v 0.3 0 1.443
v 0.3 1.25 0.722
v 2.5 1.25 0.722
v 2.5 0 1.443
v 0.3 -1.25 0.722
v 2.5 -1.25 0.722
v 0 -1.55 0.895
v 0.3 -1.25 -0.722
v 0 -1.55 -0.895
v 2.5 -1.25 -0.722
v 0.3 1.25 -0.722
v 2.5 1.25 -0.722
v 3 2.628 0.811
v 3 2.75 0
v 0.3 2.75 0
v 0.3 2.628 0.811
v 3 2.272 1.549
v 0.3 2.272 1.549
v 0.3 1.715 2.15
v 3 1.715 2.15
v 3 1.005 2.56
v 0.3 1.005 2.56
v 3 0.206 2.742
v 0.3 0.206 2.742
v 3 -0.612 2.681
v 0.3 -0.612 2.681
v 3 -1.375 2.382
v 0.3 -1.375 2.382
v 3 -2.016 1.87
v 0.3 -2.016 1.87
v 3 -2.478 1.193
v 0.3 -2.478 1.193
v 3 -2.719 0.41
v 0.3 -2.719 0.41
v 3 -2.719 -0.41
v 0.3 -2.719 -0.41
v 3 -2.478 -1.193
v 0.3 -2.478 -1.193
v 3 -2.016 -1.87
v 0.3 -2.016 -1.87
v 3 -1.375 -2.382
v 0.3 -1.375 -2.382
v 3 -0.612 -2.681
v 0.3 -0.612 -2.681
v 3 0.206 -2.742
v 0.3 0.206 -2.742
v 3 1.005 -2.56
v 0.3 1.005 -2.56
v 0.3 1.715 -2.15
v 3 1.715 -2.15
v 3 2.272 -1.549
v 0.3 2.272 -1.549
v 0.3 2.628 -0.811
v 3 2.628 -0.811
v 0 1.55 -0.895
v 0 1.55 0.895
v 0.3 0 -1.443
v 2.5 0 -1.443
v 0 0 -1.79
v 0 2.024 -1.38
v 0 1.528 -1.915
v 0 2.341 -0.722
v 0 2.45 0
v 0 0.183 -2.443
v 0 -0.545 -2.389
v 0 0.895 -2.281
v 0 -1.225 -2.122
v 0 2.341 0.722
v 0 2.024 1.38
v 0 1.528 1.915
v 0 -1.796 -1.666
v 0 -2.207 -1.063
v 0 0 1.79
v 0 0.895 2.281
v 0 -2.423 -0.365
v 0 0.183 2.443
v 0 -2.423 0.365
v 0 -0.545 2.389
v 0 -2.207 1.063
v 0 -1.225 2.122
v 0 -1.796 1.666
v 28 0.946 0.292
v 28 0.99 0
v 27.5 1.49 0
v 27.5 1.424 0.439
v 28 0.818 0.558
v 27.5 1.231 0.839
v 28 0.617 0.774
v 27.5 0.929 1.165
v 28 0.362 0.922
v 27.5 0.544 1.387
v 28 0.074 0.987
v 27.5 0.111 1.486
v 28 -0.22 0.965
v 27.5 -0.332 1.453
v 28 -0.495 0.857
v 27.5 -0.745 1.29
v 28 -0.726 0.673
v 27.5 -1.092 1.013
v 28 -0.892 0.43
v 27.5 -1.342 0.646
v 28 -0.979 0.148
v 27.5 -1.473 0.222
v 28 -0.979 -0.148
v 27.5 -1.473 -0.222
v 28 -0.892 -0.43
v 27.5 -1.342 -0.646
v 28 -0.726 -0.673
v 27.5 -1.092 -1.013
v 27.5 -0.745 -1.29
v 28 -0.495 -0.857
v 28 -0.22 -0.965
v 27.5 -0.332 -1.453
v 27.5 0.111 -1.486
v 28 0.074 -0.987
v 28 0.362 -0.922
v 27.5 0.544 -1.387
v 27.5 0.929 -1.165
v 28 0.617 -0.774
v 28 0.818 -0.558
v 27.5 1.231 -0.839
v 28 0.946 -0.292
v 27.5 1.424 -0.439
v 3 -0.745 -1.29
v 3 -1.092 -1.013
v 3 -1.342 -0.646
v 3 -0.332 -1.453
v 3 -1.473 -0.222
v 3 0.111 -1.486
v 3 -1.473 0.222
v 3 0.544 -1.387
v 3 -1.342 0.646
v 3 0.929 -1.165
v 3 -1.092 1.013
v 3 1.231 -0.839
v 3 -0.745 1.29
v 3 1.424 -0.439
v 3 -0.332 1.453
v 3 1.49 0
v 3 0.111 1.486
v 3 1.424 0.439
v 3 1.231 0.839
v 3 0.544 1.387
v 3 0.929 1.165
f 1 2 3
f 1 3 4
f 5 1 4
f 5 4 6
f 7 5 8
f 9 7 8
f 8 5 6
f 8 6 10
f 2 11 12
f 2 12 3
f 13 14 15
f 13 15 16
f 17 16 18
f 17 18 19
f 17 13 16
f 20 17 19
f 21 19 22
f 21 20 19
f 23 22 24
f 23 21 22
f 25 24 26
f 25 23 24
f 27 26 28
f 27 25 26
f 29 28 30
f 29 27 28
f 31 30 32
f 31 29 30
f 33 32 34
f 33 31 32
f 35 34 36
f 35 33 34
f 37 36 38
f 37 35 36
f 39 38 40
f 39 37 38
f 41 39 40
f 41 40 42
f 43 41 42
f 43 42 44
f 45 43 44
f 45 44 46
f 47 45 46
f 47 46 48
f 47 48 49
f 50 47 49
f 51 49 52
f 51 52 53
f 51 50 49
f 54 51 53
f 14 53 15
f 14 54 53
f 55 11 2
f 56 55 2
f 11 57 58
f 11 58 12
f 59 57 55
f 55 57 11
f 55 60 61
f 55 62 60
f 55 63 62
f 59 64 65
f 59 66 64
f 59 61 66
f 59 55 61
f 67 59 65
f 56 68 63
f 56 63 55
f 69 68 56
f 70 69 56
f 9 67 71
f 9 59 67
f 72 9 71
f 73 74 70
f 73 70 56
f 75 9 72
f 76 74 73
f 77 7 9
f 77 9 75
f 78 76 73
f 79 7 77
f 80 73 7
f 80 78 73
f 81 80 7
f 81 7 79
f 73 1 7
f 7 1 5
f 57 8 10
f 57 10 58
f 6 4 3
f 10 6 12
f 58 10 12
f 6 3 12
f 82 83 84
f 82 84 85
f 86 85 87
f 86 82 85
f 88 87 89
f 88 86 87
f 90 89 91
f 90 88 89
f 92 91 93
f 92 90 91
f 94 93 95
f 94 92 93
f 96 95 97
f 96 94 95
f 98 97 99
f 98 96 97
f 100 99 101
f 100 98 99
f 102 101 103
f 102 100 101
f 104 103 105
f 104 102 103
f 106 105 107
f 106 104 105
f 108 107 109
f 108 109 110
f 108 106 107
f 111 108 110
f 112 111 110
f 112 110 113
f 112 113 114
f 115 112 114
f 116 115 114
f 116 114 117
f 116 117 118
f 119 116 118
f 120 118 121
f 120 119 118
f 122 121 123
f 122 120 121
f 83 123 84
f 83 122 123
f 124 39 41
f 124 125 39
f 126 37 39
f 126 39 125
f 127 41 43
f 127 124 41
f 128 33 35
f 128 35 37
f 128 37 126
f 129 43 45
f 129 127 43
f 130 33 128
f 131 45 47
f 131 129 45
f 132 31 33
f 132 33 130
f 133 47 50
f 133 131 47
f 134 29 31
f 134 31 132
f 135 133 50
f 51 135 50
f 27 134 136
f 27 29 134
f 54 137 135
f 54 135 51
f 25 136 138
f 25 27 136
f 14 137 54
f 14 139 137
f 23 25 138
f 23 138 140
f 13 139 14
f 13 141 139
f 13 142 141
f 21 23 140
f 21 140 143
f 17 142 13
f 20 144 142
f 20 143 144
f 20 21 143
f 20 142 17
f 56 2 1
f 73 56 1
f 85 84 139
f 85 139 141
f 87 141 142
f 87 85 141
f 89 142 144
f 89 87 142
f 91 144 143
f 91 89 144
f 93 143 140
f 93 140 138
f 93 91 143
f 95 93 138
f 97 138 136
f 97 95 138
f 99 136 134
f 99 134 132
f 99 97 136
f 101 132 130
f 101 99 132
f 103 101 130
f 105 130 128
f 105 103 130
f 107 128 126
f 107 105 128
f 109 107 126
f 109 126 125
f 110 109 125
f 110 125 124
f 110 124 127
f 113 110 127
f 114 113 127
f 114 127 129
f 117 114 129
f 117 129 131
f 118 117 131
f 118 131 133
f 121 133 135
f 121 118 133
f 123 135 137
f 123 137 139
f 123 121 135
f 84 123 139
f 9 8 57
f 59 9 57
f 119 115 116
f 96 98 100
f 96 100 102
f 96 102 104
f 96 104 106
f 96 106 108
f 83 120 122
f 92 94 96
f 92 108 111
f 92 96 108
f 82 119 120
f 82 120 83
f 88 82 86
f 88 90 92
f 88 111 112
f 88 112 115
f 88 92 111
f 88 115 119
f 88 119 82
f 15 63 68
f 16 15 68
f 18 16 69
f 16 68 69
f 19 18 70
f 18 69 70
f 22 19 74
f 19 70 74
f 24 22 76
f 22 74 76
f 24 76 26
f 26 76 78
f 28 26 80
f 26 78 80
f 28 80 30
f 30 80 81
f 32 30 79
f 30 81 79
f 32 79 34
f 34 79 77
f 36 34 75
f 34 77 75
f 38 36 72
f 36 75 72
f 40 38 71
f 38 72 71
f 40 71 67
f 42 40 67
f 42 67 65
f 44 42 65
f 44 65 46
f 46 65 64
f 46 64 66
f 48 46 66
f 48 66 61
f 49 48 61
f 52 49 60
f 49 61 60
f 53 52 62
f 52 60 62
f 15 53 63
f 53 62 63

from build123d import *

# Parameters (mm, degrees)
CHAMFER1_SIZE      = 0.5
CHAMFER2_SIZE      = 0.3
CUT_EXTRUDE1_DEPTH = 2.5
CHAMFER3_SIZE      = 0.3


with BuildPart() as part:
    # Sketch1 → Revolve1 (revolve)
    with BuildSketch(Plane.XY):
        Polygon((0, 0), (0, 2.75), (3, 2.75), (3, 1.49), (28, 1.49), (28, 0), align=None)
    revolve(axis=Axis((-88.705490849, 0, 0), (1, 0, 0)))

    # Chamfer1
    chamfer1_edges = [part.edges().sort_by_distance(p)[0] for p in [
        (28, -1.49, 0),
    ]]
    chamfer(chamfer1_edges, length=CHAMFER1_SIZE)

    # Chamfer2
    chamfer2_edges = [part.edges().sort_by_distance(p)[0] for p in [
        (0, -2.75, 0),
    ]]
    chamfer(chamfer2_edges, length=CHAMFER2_SIZE)

    # Sketch3 → Cut-Extrude1 (cut)
    with BuildSketch(Plane(origin=(0, 0, 0), x_dir=(0, 0, -1), z_dir=(1, 0, 0))):
        Polygon((-1.443375673, 0), (-0.721687836, -1.25), (0.721687836, -1.25), (1.443375673, 0), (0.721687836, 1.25), (-0.721687836, 1.25), align=None)
    extrude(amount=CUT_EXTRUDE1_DEPTH, mode=Mode.SUBTRACT)

    # Chamfer3
    chamfer3_edges = [part.edges().sort_by_distance(p)[0] for p in [
        (0, 0.625, 1.082531755),
        (0, -0.625, 1.082531755),
        (0, -1.25, 0),
        (0, -0.625, -1.082531755),
        (0, 0.625, -1.082531755),
        (0, 1.25, 0),
    ]]
    chamfer(chamfer3_edges, length=CHAMFER3_SIZE)


solid = part.part
